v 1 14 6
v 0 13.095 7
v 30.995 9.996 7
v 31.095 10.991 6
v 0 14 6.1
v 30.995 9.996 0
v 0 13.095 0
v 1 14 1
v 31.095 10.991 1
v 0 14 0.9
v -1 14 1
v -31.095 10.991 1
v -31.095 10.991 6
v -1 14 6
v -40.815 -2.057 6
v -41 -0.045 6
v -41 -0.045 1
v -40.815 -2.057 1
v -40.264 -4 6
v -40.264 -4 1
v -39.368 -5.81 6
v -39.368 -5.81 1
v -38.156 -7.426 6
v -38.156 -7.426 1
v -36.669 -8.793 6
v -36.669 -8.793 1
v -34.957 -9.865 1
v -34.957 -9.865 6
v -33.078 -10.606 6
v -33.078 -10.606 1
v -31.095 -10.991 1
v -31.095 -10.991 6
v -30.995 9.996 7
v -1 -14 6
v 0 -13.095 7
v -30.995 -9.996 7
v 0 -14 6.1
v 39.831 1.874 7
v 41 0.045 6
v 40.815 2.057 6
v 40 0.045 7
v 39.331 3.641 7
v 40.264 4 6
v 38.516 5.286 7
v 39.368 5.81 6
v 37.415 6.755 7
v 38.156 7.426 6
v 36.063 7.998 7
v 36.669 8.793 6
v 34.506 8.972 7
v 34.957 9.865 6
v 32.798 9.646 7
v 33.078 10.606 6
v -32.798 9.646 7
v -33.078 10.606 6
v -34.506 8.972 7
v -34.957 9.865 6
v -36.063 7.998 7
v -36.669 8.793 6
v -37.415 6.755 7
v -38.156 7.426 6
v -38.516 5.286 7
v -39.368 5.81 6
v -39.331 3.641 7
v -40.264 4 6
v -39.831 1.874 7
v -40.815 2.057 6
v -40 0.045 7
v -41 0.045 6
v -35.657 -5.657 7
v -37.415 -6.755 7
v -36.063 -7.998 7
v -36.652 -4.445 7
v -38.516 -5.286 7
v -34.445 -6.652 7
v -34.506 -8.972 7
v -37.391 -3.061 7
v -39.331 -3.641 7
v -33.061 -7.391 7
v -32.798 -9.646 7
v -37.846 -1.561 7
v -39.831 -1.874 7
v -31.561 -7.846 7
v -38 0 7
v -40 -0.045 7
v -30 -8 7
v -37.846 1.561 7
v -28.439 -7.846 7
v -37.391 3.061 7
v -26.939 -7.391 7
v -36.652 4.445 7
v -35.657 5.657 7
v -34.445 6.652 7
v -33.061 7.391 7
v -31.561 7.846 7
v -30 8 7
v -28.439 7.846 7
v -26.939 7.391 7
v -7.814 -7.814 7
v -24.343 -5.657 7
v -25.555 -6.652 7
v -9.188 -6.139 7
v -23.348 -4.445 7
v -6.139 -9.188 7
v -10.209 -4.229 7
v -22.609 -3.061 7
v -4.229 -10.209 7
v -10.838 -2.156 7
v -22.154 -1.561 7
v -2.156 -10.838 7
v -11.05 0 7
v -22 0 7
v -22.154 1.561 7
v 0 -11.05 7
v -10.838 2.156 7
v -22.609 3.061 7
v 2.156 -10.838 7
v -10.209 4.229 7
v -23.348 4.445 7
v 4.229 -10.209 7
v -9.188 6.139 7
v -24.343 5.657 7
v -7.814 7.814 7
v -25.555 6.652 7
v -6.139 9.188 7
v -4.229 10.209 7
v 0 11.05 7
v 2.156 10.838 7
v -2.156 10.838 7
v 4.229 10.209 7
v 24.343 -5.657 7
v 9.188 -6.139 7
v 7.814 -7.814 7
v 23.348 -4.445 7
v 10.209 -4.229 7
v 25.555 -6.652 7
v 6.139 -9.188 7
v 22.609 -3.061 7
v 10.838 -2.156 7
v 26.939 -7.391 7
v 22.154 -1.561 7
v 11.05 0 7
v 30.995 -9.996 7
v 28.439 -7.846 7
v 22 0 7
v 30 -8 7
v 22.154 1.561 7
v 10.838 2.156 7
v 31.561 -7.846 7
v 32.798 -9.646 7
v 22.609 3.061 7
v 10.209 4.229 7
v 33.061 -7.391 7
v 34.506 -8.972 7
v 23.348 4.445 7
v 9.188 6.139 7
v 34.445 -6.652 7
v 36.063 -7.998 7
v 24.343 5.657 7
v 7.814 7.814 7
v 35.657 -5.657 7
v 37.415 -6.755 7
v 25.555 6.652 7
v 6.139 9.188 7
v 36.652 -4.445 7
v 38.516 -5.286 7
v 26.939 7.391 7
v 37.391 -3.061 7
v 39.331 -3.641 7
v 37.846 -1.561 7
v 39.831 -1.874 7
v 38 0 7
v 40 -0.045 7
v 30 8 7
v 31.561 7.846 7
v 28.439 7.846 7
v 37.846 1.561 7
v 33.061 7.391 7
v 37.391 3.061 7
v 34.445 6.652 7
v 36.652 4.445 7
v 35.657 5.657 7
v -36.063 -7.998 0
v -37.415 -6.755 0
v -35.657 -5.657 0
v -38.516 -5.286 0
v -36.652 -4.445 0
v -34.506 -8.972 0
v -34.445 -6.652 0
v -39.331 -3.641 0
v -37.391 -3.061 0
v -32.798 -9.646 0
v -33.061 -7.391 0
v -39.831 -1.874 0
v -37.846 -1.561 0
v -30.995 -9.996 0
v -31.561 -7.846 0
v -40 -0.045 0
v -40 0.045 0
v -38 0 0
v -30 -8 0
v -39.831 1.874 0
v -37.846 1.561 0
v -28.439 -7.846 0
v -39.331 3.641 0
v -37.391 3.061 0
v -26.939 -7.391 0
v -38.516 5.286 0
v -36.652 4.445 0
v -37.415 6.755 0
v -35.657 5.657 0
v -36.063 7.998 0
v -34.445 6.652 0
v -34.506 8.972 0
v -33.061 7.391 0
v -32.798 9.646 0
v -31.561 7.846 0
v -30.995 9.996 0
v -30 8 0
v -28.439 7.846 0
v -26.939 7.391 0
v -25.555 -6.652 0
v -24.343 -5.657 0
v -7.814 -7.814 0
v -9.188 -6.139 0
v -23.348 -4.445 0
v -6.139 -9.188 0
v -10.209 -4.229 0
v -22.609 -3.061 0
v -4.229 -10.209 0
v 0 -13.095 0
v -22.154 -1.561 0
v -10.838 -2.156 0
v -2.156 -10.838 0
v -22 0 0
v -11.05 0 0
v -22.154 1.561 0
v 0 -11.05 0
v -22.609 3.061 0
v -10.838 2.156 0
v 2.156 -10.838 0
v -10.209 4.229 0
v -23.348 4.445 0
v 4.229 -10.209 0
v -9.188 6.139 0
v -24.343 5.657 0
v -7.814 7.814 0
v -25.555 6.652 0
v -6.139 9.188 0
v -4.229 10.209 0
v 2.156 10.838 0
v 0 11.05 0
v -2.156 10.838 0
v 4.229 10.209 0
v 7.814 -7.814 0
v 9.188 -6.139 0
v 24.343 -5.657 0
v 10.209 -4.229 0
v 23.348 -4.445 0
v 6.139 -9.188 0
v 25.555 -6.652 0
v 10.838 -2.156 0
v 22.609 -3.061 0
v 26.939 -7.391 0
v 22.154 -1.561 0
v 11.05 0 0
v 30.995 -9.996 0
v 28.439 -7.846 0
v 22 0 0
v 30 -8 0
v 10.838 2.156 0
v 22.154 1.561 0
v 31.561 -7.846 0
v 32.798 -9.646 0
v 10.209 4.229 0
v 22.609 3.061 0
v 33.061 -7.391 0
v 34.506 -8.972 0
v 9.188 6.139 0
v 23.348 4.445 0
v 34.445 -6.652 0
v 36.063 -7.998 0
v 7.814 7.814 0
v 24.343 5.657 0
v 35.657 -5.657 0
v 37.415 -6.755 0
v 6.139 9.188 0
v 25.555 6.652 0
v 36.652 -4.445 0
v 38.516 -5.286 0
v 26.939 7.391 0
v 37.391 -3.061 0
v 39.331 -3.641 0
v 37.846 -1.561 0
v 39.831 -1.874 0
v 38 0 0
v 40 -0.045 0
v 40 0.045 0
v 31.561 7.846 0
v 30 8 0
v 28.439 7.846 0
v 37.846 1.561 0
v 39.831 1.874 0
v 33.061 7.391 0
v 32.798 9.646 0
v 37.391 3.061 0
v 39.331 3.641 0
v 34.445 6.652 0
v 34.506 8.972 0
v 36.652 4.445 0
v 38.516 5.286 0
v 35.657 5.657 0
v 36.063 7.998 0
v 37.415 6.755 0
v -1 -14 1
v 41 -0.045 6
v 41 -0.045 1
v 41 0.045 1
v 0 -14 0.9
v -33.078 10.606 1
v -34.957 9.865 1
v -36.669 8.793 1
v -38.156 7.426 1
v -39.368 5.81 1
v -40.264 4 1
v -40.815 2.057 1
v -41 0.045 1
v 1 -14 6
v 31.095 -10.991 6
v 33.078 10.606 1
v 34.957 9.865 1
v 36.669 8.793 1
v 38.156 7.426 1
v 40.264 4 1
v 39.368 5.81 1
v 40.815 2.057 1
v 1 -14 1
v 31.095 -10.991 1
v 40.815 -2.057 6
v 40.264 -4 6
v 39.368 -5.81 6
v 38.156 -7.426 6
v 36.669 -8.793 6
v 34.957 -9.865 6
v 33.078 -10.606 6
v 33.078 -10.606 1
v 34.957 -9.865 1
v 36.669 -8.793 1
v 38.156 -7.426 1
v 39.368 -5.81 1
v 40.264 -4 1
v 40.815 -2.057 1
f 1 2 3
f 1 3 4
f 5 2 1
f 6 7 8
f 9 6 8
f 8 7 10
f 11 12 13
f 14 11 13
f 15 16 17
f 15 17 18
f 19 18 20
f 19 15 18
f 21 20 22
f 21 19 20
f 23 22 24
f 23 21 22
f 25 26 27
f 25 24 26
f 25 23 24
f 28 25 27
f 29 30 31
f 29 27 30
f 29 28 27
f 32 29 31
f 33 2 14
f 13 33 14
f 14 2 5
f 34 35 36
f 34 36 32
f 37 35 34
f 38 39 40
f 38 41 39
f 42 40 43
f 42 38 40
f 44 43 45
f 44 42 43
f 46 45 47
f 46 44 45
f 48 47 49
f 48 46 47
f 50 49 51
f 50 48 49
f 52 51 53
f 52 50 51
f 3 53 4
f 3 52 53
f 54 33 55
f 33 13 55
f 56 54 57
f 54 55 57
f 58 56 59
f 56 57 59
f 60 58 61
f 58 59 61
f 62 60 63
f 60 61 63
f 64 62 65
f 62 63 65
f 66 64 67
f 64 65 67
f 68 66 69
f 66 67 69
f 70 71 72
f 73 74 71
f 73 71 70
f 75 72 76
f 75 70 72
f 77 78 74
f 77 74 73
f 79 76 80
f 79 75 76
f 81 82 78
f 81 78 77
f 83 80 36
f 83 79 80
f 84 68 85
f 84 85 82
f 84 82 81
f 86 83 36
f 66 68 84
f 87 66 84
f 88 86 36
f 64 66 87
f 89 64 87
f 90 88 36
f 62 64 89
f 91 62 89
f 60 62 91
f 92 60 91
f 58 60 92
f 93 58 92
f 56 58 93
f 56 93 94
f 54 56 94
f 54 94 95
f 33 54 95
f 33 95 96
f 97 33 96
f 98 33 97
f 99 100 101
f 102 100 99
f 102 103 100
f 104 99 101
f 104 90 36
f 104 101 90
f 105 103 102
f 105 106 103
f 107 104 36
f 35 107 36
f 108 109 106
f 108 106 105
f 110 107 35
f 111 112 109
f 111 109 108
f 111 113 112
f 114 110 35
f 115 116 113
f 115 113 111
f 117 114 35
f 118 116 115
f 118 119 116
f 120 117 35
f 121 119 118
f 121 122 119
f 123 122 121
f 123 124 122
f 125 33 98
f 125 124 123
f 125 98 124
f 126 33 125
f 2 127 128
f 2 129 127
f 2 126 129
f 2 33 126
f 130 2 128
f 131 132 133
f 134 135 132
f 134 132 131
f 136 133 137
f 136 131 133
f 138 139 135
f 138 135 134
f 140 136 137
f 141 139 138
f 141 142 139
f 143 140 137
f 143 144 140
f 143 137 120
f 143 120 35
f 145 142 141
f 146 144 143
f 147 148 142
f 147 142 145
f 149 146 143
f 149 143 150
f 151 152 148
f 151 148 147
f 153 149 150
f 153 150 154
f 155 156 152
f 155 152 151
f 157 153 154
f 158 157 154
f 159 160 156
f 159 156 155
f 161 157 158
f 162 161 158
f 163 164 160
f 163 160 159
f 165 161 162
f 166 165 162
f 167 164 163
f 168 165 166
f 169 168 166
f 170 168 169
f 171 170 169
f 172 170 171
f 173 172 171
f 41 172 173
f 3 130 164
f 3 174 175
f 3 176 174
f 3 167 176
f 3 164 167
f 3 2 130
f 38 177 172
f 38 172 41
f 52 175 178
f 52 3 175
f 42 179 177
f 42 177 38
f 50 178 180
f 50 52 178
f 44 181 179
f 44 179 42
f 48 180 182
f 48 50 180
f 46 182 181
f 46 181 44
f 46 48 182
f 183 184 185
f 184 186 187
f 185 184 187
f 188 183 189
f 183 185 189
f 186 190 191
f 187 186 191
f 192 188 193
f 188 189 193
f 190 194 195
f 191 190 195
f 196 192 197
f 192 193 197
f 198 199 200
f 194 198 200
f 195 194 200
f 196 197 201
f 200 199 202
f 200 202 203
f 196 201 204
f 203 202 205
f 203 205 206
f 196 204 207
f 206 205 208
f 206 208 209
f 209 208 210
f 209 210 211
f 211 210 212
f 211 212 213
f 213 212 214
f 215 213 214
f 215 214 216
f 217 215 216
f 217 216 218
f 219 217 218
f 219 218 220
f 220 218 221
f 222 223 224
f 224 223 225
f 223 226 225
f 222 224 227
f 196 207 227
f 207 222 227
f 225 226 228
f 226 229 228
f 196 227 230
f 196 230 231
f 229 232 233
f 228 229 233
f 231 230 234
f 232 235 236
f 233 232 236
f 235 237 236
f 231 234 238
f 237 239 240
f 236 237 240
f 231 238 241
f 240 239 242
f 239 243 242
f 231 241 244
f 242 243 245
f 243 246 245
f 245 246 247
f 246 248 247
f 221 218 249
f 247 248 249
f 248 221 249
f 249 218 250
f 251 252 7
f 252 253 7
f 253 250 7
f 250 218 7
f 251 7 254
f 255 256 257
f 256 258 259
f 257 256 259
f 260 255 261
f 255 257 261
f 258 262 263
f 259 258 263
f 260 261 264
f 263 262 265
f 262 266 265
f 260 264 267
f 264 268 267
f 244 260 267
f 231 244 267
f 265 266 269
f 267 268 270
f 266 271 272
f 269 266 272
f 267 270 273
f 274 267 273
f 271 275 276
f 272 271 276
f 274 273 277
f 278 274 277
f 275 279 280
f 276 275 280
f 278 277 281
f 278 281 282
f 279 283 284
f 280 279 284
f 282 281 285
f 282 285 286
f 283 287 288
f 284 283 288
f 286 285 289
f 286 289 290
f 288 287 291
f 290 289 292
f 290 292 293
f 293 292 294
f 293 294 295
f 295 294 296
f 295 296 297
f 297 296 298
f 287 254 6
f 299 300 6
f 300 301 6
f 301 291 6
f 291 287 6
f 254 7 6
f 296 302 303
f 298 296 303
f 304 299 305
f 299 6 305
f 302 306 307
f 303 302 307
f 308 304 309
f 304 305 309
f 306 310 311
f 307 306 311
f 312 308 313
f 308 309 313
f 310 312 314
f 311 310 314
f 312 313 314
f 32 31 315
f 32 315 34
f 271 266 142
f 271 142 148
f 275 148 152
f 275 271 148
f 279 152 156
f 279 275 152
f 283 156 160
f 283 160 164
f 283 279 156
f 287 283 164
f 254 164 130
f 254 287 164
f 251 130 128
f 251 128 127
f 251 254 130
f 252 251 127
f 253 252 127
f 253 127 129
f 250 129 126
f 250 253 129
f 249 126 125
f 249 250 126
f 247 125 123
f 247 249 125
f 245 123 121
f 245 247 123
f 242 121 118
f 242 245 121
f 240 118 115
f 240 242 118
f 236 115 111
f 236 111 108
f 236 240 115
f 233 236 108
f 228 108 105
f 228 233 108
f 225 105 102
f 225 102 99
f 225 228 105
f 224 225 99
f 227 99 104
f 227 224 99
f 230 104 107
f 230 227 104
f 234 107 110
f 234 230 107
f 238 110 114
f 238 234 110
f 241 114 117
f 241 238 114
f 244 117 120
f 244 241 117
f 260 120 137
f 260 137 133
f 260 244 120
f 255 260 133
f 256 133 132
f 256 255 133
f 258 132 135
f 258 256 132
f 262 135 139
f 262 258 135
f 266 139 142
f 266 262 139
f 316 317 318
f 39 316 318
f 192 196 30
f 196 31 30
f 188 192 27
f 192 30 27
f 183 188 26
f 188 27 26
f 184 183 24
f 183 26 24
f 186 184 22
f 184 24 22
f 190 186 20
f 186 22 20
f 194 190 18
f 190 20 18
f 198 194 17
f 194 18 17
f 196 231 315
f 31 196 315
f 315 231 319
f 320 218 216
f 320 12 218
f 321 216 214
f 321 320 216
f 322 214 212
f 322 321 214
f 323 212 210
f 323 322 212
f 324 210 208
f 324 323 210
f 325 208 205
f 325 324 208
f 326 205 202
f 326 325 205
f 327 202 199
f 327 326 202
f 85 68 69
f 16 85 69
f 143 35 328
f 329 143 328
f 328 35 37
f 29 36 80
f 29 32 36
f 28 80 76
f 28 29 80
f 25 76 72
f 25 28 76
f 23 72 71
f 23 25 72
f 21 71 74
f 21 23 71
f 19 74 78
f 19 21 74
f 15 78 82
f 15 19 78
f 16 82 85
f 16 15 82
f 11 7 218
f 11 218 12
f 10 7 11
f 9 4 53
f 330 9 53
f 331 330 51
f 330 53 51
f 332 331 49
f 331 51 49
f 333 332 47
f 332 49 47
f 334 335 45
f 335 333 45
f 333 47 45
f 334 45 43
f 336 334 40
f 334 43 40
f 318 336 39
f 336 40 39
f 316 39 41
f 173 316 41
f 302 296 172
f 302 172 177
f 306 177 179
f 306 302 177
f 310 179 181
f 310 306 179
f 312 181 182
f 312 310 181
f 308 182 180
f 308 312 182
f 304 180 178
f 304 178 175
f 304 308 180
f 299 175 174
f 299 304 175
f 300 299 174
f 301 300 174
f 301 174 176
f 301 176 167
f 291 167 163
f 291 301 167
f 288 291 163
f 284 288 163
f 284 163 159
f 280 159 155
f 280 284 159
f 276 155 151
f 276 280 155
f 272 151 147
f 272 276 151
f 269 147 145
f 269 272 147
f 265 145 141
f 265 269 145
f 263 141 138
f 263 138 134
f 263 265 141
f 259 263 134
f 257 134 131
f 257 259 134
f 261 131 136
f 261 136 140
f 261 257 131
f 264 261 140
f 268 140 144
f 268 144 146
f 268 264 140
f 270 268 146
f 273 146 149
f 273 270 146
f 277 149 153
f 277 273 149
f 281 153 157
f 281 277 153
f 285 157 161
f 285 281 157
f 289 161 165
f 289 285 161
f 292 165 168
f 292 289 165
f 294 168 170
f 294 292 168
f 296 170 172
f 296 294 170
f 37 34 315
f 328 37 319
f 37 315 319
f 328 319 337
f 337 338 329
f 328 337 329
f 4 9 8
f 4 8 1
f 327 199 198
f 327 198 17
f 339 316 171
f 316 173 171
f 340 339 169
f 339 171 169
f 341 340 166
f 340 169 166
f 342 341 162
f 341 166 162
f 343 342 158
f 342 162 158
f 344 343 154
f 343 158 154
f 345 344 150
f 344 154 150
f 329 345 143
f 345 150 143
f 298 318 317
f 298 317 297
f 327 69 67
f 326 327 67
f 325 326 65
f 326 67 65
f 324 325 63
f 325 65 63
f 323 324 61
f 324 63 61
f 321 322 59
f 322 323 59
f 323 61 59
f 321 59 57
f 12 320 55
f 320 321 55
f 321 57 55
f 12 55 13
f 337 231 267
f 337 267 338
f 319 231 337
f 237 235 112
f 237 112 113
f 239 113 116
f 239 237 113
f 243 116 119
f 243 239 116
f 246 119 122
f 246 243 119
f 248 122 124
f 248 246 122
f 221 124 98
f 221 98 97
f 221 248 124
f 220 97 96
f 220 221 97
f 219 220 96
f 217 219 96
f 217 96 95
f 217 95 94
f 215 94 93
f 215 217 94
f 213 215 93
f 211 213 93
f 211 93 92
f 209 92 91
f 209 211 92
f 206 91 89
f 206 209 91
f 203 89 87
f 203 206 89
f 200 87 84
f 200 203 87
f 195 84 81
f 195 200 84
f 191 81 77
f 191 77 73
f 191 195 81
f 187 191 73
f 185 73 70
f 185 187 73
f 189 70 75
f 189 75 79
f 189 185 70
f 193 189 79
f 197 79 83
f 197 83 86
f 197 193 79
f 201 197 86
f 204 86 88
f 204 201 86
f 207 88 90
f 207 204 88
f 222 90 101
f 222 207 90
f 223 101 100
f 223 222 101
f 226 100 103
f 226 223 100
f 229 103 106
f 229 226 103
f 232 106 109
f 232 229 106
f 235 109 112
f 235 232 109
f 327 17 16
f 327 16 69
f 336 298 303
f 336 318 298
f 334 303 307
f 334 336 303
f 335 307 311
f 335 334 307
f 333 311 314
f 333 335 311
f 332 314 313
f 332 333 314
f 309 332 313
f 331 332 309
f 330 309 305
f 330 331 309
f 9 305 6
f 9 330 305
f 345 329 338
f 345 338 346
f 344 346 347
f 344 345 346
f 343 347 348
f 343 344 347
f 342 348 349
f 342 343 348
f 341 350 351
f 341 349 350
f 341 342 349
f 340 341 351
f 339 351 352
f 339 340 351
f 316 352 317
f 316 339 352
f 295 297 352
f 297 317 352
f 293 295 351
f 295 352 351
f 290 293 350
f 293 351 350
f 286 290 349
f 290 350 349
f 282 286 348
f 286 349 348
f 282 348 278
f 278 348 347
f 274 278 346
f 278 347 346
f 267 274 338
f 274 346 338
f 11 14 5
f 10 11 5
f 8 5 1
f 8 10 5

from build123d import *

# Parameters (mm, degrees)
F0_W         = 82
F0_H         = 28
F0_R         = 8
F0_R_2       = 11.05
F1_DEPTH     = 7
F2_SIZE2     = 4
F2_SIZE      = 40
F2_2_SIZE2   = 4
F2_2_SIZE    = 40
F3_R         = 11
F4_T1_DEPTH  = 43.1030542411
F4_T3_DEPTH  = 43.1030542411
F4_T5_DEPTH  = 43.1030542411
F4_T7_DEPTH  = 43.1030542411
F4_T9_DEPTH  = 0.0902736335
F4_T12_ANGLE = 84.2894068625
F4_T14_ANGLE = 84.2894068625
F4_T16_ANGLE = 84.2894068625
F4_T18_ANGLE = 84.2894068625
F4_T20_ANGLE = 84.2894068625
F4_T22_ANGLE = 84.2894068625
F4_T24_ANGLE = 84.2894068625
F4_T26_ANGLE = 84.2894068625


# Not quite as in the source:
# - a fillet or chamfer that OpenCascade refuses, or shapes differently, is made with other operations: its cross-section is extruded or revolved along the edge and cut away or added


with BuildPart() as f1:
    # F0 (on Top) → F1 (new body)
    with BuildSketch(Plane.XY):
        Rectangle(F0_W, F0_H)
        with Locations((-30, 0)):
            Circle(F0_R, mode=Mode.SUBTRACT)
        Circle(F0_R_2, mode=Mode.SUBTRACT)
        with Locations((30, 0)):
            Circle(F0_R, mode=Mode.SUBTRACT)
    extrude(amount=F1_DEPTH)

    # F2
    f2_edges = [f1.edges().sort_by_distance(p)[0] for p in [
        (-41, -14, 3.5),
        (41, -14, 3.5),
    ]]
    f2_side = f1.faces().sort_by_distance((0, -14, 3.5))[0]
    chamfer(f2_edges, length=F2_SIZE, length2=F2_SIZE2, reference=f2_side)

    # F2#2
    f2_2_edges = [f1.edges().sort_by_distance(p)[0] for p in [
        (41, 14, 3.5),
        (-41, 14, 3.5),
    ]]
    f2_2_side = f1.faces().sort_by_distance((0, 14, 3.5))[0]
    chamfer(f2_2_edges, length=F2_2_SIZE, length2=F2_2_SIZE2, reference=f2_2_side)

    # F3
    f3_edges = [f1.edges().sort_by_distance(p)[0] for p in [
        (-41, 10, 3.5),
        (-41, -10, 3.5),
        (41, 10, 3.5),
        (41, -10, 3.5),
    ]]
    fillet(f3_edges, radius=F3_R)

    # F4: chamfer of 1 on 20 edges, made by hand

    # F4_s2 → F4_t1 (cut)
    with BuildSketch(Plane(origin=(13.1906406762, -1.3190640676, 0), x_dir=(0, 0, 1), z_dir=(-0.9950371902, 0.099503719, 0))):
        Polygon((7, -13.030024382), (6, -14.030024382), (7, -14.030024382), align=None)
        Polygon((0, -13.030024382), (1, -14.030024382), (0, -14.030024382), align=None)
    extrude(amount=F4_T1_DEPTH, mode=Mode.SUBTRACT)

    # F4_s4 → F4_t3 (cut)
    with BuildSketch(Plane(origin=(-13.1906406762, -1.3190640676, 0), x_dir=(0, 0, 1), z_dir=(0.9950371902, 0.099503719, 0))):
        Polygon((7, 13.030024382), (6, 14.030024382), (7, 14.030024382), align=None)
        Polygon((0, 13.030024382), (1, 14.030024382), (0, 14.030024382), align=None)
    extrude(amount=F4_T3_DEPTH, mode=Mode.SUBTRACT)

    # F4_s6 → F4_t5 (cut)
    with BuildSketch(Plane(origin=(-13.1906406762, 1.3190640676, 0), x_dir=(0, 0, 1), z_dir=(0.9950371902, -0.099503719, 0))):
        Polygon((7, -13.030024382), (6, -14.030024382), (7, -14.030024382), align=None)
        Polygon((0, -13.030024382), (1, -14.030024382), (0, -14.030024382), align=None)
    extrude(amount=F4_T5_DEPTH, mode=Mode.SUBTRACT)

    # F4_s8 → F4_t7 (cut)
    with BuildSketch(Plane(origin=(13.1906406762, 1.3190640676, 0), x_dir=(0, 0, 1), z_dir=(-0.9950371902, -0.099503719, 0))):
        Polygon((7, 13.030024382), (6, 14.030024382), (7, 14.030024382), align=None)
        Polygon((0, 13.030024382), (1, 14.030024382), (0, 14.030024382), align=None)
    extrude(amount=F4_T7_DEPTH, mode=Mode.SUBTRACT)

    # F4_s10 → F4_t9 (cut)
    with BuildSketch(Plane.XZ.offset(-0.0451368168)):
        Polygon((41, 1), (40, 0), (41, 0), align=None)
        Polygon((41, 6), (40, 7), (41, 7), align=None)
        Polygon((-40, 0), (-41, 1), (-41, 0), align=None)
        Polygon((-40, 7), (-41, 6), (-41, 7), align=None)
    extrude(amount=F4_T9_DEPTH, mode=Mode.SUBTRACT)

    # F4_s11 → F4_t12 (revolve, cut)
    with BuildSketch(Plane.XZ.offset(0.0451368168)):
        Polygon((40, 0), (41, 1), (41, 0), align=None)
    revolve(axis=Axis((30, -0.0451368168, 0), (0, 0, -1)), revolution_arc=F4_T12_ANGLE, mode=Mode.SUBTRACT)

    # F4_s13 → F4_t14 (revolve, cut)
    with BuildSketch(Plane.XZ.offset(-0.0451368168)):
        Polygon((40, 0), (41, 1), (41, 0), align=None)
    revolve(axis=Axis((30, 0.0451368168, 0), (0, 0, 1)), revolution_arc=F4_T14_ANGLE, mode=Mode.SUBTRACT)

    # F4_s15 → F4_t16 (revolve, cut)
    with BuildSketch(Plane(origin=(-29.6985013053, 2.9698501305, 0), x_dir=(0, 0, 1), z_dir=(0.9950371902, -0.099503719, 0))):
        Polygon((0, 13.030024382), (1, 14.030024382), (0, 14.030024382), align=None)
    revolve(axis=Axis((-30, -0.0451368168, 0), (0, 0, -1)), revolution_arc=F4_T16_ANGLE, mode=Mode.SUBTRACT)

    # F4_s17 → F4_t18 (revolve, cut)
    with BuildSketch(Plane(origin=(-29.6985013053, -2.9698501305, 0), x_dir=(0, 0, 1), z_dir=(0.9950371902, 0.099503719, 0))):
        Polygon((0, -13.030024382), (1, -14.030024382), (0, -14.030024382), align=None)
    revolve(axis=Axis((-30, 0.0451368168, 0), (0, 0, 1)), revolution_arc=F4_T18_ANGLE, mode=Mode.SUBTRACT)

    # F4_s19 → F4_t20 (revolve, cut)
    with BuildSketch(Plane.XZ.offset(0.0451368168)):
        Polygon((41, 6), (40, 7), (41, 7), align=None)
    revolve(axis=Axis((30, -0.0451368168, 7), (0, 0, -1)), revolution_arc=F4_T20_ANGLE, mode=Mode.SUBTRACT)

    # F4_s21 → F4_t22 (revolve, cut)
    with BuildSketch(Plane.XZ.offset(-0.0451368168)):
        Polygon((41, 6), (40, 7), (41, 7), align=None)
    revolve(axis=Axis((30, 0.0451368168, 7), (0, 0, 1)), revolution_arc=F4_T22_ANGLE, mode=Mode.SUBTRACT)

    # F4_s23 → F4_t24 (revolve, cut)
    with BuildSketch(Plane(origin=(-29.6985013053, 2.9698501305, 0), x_dir=(0, 0, 1), z_dir=(0.9950371902, -0.099503719, 0))):
        Polygon((7, 13.030024382), (6, 14.030024382), (7, 14.030024382), align=None)
    revolve(axis=Axis((-30, -0.0451368168, 7), (0, 0, -1)), revolution_arc=F4_T24_ANGLE, mode=Mode.SUBTRACT)

    # F4_s25 → F4_t26 (revolve, cut)
    with BuildSketch(Plane(origin=(-29.6985013053, -2.9698501305, 0), x_dir=(0, 0, 1), z_dir=(0.9950371902, 0.099503719, 0))):
        Polygon((7, -13.030024382), (6, -14.030024382), (7, -14.030024382), align=None)
    revolve(axis=Axis((-30, 0.0451368168, 7), (0, 0, 1)), revolution_arc=F4_T26_ANGLE, mode=Mode.SUBTRACT)


solid = f1.part
